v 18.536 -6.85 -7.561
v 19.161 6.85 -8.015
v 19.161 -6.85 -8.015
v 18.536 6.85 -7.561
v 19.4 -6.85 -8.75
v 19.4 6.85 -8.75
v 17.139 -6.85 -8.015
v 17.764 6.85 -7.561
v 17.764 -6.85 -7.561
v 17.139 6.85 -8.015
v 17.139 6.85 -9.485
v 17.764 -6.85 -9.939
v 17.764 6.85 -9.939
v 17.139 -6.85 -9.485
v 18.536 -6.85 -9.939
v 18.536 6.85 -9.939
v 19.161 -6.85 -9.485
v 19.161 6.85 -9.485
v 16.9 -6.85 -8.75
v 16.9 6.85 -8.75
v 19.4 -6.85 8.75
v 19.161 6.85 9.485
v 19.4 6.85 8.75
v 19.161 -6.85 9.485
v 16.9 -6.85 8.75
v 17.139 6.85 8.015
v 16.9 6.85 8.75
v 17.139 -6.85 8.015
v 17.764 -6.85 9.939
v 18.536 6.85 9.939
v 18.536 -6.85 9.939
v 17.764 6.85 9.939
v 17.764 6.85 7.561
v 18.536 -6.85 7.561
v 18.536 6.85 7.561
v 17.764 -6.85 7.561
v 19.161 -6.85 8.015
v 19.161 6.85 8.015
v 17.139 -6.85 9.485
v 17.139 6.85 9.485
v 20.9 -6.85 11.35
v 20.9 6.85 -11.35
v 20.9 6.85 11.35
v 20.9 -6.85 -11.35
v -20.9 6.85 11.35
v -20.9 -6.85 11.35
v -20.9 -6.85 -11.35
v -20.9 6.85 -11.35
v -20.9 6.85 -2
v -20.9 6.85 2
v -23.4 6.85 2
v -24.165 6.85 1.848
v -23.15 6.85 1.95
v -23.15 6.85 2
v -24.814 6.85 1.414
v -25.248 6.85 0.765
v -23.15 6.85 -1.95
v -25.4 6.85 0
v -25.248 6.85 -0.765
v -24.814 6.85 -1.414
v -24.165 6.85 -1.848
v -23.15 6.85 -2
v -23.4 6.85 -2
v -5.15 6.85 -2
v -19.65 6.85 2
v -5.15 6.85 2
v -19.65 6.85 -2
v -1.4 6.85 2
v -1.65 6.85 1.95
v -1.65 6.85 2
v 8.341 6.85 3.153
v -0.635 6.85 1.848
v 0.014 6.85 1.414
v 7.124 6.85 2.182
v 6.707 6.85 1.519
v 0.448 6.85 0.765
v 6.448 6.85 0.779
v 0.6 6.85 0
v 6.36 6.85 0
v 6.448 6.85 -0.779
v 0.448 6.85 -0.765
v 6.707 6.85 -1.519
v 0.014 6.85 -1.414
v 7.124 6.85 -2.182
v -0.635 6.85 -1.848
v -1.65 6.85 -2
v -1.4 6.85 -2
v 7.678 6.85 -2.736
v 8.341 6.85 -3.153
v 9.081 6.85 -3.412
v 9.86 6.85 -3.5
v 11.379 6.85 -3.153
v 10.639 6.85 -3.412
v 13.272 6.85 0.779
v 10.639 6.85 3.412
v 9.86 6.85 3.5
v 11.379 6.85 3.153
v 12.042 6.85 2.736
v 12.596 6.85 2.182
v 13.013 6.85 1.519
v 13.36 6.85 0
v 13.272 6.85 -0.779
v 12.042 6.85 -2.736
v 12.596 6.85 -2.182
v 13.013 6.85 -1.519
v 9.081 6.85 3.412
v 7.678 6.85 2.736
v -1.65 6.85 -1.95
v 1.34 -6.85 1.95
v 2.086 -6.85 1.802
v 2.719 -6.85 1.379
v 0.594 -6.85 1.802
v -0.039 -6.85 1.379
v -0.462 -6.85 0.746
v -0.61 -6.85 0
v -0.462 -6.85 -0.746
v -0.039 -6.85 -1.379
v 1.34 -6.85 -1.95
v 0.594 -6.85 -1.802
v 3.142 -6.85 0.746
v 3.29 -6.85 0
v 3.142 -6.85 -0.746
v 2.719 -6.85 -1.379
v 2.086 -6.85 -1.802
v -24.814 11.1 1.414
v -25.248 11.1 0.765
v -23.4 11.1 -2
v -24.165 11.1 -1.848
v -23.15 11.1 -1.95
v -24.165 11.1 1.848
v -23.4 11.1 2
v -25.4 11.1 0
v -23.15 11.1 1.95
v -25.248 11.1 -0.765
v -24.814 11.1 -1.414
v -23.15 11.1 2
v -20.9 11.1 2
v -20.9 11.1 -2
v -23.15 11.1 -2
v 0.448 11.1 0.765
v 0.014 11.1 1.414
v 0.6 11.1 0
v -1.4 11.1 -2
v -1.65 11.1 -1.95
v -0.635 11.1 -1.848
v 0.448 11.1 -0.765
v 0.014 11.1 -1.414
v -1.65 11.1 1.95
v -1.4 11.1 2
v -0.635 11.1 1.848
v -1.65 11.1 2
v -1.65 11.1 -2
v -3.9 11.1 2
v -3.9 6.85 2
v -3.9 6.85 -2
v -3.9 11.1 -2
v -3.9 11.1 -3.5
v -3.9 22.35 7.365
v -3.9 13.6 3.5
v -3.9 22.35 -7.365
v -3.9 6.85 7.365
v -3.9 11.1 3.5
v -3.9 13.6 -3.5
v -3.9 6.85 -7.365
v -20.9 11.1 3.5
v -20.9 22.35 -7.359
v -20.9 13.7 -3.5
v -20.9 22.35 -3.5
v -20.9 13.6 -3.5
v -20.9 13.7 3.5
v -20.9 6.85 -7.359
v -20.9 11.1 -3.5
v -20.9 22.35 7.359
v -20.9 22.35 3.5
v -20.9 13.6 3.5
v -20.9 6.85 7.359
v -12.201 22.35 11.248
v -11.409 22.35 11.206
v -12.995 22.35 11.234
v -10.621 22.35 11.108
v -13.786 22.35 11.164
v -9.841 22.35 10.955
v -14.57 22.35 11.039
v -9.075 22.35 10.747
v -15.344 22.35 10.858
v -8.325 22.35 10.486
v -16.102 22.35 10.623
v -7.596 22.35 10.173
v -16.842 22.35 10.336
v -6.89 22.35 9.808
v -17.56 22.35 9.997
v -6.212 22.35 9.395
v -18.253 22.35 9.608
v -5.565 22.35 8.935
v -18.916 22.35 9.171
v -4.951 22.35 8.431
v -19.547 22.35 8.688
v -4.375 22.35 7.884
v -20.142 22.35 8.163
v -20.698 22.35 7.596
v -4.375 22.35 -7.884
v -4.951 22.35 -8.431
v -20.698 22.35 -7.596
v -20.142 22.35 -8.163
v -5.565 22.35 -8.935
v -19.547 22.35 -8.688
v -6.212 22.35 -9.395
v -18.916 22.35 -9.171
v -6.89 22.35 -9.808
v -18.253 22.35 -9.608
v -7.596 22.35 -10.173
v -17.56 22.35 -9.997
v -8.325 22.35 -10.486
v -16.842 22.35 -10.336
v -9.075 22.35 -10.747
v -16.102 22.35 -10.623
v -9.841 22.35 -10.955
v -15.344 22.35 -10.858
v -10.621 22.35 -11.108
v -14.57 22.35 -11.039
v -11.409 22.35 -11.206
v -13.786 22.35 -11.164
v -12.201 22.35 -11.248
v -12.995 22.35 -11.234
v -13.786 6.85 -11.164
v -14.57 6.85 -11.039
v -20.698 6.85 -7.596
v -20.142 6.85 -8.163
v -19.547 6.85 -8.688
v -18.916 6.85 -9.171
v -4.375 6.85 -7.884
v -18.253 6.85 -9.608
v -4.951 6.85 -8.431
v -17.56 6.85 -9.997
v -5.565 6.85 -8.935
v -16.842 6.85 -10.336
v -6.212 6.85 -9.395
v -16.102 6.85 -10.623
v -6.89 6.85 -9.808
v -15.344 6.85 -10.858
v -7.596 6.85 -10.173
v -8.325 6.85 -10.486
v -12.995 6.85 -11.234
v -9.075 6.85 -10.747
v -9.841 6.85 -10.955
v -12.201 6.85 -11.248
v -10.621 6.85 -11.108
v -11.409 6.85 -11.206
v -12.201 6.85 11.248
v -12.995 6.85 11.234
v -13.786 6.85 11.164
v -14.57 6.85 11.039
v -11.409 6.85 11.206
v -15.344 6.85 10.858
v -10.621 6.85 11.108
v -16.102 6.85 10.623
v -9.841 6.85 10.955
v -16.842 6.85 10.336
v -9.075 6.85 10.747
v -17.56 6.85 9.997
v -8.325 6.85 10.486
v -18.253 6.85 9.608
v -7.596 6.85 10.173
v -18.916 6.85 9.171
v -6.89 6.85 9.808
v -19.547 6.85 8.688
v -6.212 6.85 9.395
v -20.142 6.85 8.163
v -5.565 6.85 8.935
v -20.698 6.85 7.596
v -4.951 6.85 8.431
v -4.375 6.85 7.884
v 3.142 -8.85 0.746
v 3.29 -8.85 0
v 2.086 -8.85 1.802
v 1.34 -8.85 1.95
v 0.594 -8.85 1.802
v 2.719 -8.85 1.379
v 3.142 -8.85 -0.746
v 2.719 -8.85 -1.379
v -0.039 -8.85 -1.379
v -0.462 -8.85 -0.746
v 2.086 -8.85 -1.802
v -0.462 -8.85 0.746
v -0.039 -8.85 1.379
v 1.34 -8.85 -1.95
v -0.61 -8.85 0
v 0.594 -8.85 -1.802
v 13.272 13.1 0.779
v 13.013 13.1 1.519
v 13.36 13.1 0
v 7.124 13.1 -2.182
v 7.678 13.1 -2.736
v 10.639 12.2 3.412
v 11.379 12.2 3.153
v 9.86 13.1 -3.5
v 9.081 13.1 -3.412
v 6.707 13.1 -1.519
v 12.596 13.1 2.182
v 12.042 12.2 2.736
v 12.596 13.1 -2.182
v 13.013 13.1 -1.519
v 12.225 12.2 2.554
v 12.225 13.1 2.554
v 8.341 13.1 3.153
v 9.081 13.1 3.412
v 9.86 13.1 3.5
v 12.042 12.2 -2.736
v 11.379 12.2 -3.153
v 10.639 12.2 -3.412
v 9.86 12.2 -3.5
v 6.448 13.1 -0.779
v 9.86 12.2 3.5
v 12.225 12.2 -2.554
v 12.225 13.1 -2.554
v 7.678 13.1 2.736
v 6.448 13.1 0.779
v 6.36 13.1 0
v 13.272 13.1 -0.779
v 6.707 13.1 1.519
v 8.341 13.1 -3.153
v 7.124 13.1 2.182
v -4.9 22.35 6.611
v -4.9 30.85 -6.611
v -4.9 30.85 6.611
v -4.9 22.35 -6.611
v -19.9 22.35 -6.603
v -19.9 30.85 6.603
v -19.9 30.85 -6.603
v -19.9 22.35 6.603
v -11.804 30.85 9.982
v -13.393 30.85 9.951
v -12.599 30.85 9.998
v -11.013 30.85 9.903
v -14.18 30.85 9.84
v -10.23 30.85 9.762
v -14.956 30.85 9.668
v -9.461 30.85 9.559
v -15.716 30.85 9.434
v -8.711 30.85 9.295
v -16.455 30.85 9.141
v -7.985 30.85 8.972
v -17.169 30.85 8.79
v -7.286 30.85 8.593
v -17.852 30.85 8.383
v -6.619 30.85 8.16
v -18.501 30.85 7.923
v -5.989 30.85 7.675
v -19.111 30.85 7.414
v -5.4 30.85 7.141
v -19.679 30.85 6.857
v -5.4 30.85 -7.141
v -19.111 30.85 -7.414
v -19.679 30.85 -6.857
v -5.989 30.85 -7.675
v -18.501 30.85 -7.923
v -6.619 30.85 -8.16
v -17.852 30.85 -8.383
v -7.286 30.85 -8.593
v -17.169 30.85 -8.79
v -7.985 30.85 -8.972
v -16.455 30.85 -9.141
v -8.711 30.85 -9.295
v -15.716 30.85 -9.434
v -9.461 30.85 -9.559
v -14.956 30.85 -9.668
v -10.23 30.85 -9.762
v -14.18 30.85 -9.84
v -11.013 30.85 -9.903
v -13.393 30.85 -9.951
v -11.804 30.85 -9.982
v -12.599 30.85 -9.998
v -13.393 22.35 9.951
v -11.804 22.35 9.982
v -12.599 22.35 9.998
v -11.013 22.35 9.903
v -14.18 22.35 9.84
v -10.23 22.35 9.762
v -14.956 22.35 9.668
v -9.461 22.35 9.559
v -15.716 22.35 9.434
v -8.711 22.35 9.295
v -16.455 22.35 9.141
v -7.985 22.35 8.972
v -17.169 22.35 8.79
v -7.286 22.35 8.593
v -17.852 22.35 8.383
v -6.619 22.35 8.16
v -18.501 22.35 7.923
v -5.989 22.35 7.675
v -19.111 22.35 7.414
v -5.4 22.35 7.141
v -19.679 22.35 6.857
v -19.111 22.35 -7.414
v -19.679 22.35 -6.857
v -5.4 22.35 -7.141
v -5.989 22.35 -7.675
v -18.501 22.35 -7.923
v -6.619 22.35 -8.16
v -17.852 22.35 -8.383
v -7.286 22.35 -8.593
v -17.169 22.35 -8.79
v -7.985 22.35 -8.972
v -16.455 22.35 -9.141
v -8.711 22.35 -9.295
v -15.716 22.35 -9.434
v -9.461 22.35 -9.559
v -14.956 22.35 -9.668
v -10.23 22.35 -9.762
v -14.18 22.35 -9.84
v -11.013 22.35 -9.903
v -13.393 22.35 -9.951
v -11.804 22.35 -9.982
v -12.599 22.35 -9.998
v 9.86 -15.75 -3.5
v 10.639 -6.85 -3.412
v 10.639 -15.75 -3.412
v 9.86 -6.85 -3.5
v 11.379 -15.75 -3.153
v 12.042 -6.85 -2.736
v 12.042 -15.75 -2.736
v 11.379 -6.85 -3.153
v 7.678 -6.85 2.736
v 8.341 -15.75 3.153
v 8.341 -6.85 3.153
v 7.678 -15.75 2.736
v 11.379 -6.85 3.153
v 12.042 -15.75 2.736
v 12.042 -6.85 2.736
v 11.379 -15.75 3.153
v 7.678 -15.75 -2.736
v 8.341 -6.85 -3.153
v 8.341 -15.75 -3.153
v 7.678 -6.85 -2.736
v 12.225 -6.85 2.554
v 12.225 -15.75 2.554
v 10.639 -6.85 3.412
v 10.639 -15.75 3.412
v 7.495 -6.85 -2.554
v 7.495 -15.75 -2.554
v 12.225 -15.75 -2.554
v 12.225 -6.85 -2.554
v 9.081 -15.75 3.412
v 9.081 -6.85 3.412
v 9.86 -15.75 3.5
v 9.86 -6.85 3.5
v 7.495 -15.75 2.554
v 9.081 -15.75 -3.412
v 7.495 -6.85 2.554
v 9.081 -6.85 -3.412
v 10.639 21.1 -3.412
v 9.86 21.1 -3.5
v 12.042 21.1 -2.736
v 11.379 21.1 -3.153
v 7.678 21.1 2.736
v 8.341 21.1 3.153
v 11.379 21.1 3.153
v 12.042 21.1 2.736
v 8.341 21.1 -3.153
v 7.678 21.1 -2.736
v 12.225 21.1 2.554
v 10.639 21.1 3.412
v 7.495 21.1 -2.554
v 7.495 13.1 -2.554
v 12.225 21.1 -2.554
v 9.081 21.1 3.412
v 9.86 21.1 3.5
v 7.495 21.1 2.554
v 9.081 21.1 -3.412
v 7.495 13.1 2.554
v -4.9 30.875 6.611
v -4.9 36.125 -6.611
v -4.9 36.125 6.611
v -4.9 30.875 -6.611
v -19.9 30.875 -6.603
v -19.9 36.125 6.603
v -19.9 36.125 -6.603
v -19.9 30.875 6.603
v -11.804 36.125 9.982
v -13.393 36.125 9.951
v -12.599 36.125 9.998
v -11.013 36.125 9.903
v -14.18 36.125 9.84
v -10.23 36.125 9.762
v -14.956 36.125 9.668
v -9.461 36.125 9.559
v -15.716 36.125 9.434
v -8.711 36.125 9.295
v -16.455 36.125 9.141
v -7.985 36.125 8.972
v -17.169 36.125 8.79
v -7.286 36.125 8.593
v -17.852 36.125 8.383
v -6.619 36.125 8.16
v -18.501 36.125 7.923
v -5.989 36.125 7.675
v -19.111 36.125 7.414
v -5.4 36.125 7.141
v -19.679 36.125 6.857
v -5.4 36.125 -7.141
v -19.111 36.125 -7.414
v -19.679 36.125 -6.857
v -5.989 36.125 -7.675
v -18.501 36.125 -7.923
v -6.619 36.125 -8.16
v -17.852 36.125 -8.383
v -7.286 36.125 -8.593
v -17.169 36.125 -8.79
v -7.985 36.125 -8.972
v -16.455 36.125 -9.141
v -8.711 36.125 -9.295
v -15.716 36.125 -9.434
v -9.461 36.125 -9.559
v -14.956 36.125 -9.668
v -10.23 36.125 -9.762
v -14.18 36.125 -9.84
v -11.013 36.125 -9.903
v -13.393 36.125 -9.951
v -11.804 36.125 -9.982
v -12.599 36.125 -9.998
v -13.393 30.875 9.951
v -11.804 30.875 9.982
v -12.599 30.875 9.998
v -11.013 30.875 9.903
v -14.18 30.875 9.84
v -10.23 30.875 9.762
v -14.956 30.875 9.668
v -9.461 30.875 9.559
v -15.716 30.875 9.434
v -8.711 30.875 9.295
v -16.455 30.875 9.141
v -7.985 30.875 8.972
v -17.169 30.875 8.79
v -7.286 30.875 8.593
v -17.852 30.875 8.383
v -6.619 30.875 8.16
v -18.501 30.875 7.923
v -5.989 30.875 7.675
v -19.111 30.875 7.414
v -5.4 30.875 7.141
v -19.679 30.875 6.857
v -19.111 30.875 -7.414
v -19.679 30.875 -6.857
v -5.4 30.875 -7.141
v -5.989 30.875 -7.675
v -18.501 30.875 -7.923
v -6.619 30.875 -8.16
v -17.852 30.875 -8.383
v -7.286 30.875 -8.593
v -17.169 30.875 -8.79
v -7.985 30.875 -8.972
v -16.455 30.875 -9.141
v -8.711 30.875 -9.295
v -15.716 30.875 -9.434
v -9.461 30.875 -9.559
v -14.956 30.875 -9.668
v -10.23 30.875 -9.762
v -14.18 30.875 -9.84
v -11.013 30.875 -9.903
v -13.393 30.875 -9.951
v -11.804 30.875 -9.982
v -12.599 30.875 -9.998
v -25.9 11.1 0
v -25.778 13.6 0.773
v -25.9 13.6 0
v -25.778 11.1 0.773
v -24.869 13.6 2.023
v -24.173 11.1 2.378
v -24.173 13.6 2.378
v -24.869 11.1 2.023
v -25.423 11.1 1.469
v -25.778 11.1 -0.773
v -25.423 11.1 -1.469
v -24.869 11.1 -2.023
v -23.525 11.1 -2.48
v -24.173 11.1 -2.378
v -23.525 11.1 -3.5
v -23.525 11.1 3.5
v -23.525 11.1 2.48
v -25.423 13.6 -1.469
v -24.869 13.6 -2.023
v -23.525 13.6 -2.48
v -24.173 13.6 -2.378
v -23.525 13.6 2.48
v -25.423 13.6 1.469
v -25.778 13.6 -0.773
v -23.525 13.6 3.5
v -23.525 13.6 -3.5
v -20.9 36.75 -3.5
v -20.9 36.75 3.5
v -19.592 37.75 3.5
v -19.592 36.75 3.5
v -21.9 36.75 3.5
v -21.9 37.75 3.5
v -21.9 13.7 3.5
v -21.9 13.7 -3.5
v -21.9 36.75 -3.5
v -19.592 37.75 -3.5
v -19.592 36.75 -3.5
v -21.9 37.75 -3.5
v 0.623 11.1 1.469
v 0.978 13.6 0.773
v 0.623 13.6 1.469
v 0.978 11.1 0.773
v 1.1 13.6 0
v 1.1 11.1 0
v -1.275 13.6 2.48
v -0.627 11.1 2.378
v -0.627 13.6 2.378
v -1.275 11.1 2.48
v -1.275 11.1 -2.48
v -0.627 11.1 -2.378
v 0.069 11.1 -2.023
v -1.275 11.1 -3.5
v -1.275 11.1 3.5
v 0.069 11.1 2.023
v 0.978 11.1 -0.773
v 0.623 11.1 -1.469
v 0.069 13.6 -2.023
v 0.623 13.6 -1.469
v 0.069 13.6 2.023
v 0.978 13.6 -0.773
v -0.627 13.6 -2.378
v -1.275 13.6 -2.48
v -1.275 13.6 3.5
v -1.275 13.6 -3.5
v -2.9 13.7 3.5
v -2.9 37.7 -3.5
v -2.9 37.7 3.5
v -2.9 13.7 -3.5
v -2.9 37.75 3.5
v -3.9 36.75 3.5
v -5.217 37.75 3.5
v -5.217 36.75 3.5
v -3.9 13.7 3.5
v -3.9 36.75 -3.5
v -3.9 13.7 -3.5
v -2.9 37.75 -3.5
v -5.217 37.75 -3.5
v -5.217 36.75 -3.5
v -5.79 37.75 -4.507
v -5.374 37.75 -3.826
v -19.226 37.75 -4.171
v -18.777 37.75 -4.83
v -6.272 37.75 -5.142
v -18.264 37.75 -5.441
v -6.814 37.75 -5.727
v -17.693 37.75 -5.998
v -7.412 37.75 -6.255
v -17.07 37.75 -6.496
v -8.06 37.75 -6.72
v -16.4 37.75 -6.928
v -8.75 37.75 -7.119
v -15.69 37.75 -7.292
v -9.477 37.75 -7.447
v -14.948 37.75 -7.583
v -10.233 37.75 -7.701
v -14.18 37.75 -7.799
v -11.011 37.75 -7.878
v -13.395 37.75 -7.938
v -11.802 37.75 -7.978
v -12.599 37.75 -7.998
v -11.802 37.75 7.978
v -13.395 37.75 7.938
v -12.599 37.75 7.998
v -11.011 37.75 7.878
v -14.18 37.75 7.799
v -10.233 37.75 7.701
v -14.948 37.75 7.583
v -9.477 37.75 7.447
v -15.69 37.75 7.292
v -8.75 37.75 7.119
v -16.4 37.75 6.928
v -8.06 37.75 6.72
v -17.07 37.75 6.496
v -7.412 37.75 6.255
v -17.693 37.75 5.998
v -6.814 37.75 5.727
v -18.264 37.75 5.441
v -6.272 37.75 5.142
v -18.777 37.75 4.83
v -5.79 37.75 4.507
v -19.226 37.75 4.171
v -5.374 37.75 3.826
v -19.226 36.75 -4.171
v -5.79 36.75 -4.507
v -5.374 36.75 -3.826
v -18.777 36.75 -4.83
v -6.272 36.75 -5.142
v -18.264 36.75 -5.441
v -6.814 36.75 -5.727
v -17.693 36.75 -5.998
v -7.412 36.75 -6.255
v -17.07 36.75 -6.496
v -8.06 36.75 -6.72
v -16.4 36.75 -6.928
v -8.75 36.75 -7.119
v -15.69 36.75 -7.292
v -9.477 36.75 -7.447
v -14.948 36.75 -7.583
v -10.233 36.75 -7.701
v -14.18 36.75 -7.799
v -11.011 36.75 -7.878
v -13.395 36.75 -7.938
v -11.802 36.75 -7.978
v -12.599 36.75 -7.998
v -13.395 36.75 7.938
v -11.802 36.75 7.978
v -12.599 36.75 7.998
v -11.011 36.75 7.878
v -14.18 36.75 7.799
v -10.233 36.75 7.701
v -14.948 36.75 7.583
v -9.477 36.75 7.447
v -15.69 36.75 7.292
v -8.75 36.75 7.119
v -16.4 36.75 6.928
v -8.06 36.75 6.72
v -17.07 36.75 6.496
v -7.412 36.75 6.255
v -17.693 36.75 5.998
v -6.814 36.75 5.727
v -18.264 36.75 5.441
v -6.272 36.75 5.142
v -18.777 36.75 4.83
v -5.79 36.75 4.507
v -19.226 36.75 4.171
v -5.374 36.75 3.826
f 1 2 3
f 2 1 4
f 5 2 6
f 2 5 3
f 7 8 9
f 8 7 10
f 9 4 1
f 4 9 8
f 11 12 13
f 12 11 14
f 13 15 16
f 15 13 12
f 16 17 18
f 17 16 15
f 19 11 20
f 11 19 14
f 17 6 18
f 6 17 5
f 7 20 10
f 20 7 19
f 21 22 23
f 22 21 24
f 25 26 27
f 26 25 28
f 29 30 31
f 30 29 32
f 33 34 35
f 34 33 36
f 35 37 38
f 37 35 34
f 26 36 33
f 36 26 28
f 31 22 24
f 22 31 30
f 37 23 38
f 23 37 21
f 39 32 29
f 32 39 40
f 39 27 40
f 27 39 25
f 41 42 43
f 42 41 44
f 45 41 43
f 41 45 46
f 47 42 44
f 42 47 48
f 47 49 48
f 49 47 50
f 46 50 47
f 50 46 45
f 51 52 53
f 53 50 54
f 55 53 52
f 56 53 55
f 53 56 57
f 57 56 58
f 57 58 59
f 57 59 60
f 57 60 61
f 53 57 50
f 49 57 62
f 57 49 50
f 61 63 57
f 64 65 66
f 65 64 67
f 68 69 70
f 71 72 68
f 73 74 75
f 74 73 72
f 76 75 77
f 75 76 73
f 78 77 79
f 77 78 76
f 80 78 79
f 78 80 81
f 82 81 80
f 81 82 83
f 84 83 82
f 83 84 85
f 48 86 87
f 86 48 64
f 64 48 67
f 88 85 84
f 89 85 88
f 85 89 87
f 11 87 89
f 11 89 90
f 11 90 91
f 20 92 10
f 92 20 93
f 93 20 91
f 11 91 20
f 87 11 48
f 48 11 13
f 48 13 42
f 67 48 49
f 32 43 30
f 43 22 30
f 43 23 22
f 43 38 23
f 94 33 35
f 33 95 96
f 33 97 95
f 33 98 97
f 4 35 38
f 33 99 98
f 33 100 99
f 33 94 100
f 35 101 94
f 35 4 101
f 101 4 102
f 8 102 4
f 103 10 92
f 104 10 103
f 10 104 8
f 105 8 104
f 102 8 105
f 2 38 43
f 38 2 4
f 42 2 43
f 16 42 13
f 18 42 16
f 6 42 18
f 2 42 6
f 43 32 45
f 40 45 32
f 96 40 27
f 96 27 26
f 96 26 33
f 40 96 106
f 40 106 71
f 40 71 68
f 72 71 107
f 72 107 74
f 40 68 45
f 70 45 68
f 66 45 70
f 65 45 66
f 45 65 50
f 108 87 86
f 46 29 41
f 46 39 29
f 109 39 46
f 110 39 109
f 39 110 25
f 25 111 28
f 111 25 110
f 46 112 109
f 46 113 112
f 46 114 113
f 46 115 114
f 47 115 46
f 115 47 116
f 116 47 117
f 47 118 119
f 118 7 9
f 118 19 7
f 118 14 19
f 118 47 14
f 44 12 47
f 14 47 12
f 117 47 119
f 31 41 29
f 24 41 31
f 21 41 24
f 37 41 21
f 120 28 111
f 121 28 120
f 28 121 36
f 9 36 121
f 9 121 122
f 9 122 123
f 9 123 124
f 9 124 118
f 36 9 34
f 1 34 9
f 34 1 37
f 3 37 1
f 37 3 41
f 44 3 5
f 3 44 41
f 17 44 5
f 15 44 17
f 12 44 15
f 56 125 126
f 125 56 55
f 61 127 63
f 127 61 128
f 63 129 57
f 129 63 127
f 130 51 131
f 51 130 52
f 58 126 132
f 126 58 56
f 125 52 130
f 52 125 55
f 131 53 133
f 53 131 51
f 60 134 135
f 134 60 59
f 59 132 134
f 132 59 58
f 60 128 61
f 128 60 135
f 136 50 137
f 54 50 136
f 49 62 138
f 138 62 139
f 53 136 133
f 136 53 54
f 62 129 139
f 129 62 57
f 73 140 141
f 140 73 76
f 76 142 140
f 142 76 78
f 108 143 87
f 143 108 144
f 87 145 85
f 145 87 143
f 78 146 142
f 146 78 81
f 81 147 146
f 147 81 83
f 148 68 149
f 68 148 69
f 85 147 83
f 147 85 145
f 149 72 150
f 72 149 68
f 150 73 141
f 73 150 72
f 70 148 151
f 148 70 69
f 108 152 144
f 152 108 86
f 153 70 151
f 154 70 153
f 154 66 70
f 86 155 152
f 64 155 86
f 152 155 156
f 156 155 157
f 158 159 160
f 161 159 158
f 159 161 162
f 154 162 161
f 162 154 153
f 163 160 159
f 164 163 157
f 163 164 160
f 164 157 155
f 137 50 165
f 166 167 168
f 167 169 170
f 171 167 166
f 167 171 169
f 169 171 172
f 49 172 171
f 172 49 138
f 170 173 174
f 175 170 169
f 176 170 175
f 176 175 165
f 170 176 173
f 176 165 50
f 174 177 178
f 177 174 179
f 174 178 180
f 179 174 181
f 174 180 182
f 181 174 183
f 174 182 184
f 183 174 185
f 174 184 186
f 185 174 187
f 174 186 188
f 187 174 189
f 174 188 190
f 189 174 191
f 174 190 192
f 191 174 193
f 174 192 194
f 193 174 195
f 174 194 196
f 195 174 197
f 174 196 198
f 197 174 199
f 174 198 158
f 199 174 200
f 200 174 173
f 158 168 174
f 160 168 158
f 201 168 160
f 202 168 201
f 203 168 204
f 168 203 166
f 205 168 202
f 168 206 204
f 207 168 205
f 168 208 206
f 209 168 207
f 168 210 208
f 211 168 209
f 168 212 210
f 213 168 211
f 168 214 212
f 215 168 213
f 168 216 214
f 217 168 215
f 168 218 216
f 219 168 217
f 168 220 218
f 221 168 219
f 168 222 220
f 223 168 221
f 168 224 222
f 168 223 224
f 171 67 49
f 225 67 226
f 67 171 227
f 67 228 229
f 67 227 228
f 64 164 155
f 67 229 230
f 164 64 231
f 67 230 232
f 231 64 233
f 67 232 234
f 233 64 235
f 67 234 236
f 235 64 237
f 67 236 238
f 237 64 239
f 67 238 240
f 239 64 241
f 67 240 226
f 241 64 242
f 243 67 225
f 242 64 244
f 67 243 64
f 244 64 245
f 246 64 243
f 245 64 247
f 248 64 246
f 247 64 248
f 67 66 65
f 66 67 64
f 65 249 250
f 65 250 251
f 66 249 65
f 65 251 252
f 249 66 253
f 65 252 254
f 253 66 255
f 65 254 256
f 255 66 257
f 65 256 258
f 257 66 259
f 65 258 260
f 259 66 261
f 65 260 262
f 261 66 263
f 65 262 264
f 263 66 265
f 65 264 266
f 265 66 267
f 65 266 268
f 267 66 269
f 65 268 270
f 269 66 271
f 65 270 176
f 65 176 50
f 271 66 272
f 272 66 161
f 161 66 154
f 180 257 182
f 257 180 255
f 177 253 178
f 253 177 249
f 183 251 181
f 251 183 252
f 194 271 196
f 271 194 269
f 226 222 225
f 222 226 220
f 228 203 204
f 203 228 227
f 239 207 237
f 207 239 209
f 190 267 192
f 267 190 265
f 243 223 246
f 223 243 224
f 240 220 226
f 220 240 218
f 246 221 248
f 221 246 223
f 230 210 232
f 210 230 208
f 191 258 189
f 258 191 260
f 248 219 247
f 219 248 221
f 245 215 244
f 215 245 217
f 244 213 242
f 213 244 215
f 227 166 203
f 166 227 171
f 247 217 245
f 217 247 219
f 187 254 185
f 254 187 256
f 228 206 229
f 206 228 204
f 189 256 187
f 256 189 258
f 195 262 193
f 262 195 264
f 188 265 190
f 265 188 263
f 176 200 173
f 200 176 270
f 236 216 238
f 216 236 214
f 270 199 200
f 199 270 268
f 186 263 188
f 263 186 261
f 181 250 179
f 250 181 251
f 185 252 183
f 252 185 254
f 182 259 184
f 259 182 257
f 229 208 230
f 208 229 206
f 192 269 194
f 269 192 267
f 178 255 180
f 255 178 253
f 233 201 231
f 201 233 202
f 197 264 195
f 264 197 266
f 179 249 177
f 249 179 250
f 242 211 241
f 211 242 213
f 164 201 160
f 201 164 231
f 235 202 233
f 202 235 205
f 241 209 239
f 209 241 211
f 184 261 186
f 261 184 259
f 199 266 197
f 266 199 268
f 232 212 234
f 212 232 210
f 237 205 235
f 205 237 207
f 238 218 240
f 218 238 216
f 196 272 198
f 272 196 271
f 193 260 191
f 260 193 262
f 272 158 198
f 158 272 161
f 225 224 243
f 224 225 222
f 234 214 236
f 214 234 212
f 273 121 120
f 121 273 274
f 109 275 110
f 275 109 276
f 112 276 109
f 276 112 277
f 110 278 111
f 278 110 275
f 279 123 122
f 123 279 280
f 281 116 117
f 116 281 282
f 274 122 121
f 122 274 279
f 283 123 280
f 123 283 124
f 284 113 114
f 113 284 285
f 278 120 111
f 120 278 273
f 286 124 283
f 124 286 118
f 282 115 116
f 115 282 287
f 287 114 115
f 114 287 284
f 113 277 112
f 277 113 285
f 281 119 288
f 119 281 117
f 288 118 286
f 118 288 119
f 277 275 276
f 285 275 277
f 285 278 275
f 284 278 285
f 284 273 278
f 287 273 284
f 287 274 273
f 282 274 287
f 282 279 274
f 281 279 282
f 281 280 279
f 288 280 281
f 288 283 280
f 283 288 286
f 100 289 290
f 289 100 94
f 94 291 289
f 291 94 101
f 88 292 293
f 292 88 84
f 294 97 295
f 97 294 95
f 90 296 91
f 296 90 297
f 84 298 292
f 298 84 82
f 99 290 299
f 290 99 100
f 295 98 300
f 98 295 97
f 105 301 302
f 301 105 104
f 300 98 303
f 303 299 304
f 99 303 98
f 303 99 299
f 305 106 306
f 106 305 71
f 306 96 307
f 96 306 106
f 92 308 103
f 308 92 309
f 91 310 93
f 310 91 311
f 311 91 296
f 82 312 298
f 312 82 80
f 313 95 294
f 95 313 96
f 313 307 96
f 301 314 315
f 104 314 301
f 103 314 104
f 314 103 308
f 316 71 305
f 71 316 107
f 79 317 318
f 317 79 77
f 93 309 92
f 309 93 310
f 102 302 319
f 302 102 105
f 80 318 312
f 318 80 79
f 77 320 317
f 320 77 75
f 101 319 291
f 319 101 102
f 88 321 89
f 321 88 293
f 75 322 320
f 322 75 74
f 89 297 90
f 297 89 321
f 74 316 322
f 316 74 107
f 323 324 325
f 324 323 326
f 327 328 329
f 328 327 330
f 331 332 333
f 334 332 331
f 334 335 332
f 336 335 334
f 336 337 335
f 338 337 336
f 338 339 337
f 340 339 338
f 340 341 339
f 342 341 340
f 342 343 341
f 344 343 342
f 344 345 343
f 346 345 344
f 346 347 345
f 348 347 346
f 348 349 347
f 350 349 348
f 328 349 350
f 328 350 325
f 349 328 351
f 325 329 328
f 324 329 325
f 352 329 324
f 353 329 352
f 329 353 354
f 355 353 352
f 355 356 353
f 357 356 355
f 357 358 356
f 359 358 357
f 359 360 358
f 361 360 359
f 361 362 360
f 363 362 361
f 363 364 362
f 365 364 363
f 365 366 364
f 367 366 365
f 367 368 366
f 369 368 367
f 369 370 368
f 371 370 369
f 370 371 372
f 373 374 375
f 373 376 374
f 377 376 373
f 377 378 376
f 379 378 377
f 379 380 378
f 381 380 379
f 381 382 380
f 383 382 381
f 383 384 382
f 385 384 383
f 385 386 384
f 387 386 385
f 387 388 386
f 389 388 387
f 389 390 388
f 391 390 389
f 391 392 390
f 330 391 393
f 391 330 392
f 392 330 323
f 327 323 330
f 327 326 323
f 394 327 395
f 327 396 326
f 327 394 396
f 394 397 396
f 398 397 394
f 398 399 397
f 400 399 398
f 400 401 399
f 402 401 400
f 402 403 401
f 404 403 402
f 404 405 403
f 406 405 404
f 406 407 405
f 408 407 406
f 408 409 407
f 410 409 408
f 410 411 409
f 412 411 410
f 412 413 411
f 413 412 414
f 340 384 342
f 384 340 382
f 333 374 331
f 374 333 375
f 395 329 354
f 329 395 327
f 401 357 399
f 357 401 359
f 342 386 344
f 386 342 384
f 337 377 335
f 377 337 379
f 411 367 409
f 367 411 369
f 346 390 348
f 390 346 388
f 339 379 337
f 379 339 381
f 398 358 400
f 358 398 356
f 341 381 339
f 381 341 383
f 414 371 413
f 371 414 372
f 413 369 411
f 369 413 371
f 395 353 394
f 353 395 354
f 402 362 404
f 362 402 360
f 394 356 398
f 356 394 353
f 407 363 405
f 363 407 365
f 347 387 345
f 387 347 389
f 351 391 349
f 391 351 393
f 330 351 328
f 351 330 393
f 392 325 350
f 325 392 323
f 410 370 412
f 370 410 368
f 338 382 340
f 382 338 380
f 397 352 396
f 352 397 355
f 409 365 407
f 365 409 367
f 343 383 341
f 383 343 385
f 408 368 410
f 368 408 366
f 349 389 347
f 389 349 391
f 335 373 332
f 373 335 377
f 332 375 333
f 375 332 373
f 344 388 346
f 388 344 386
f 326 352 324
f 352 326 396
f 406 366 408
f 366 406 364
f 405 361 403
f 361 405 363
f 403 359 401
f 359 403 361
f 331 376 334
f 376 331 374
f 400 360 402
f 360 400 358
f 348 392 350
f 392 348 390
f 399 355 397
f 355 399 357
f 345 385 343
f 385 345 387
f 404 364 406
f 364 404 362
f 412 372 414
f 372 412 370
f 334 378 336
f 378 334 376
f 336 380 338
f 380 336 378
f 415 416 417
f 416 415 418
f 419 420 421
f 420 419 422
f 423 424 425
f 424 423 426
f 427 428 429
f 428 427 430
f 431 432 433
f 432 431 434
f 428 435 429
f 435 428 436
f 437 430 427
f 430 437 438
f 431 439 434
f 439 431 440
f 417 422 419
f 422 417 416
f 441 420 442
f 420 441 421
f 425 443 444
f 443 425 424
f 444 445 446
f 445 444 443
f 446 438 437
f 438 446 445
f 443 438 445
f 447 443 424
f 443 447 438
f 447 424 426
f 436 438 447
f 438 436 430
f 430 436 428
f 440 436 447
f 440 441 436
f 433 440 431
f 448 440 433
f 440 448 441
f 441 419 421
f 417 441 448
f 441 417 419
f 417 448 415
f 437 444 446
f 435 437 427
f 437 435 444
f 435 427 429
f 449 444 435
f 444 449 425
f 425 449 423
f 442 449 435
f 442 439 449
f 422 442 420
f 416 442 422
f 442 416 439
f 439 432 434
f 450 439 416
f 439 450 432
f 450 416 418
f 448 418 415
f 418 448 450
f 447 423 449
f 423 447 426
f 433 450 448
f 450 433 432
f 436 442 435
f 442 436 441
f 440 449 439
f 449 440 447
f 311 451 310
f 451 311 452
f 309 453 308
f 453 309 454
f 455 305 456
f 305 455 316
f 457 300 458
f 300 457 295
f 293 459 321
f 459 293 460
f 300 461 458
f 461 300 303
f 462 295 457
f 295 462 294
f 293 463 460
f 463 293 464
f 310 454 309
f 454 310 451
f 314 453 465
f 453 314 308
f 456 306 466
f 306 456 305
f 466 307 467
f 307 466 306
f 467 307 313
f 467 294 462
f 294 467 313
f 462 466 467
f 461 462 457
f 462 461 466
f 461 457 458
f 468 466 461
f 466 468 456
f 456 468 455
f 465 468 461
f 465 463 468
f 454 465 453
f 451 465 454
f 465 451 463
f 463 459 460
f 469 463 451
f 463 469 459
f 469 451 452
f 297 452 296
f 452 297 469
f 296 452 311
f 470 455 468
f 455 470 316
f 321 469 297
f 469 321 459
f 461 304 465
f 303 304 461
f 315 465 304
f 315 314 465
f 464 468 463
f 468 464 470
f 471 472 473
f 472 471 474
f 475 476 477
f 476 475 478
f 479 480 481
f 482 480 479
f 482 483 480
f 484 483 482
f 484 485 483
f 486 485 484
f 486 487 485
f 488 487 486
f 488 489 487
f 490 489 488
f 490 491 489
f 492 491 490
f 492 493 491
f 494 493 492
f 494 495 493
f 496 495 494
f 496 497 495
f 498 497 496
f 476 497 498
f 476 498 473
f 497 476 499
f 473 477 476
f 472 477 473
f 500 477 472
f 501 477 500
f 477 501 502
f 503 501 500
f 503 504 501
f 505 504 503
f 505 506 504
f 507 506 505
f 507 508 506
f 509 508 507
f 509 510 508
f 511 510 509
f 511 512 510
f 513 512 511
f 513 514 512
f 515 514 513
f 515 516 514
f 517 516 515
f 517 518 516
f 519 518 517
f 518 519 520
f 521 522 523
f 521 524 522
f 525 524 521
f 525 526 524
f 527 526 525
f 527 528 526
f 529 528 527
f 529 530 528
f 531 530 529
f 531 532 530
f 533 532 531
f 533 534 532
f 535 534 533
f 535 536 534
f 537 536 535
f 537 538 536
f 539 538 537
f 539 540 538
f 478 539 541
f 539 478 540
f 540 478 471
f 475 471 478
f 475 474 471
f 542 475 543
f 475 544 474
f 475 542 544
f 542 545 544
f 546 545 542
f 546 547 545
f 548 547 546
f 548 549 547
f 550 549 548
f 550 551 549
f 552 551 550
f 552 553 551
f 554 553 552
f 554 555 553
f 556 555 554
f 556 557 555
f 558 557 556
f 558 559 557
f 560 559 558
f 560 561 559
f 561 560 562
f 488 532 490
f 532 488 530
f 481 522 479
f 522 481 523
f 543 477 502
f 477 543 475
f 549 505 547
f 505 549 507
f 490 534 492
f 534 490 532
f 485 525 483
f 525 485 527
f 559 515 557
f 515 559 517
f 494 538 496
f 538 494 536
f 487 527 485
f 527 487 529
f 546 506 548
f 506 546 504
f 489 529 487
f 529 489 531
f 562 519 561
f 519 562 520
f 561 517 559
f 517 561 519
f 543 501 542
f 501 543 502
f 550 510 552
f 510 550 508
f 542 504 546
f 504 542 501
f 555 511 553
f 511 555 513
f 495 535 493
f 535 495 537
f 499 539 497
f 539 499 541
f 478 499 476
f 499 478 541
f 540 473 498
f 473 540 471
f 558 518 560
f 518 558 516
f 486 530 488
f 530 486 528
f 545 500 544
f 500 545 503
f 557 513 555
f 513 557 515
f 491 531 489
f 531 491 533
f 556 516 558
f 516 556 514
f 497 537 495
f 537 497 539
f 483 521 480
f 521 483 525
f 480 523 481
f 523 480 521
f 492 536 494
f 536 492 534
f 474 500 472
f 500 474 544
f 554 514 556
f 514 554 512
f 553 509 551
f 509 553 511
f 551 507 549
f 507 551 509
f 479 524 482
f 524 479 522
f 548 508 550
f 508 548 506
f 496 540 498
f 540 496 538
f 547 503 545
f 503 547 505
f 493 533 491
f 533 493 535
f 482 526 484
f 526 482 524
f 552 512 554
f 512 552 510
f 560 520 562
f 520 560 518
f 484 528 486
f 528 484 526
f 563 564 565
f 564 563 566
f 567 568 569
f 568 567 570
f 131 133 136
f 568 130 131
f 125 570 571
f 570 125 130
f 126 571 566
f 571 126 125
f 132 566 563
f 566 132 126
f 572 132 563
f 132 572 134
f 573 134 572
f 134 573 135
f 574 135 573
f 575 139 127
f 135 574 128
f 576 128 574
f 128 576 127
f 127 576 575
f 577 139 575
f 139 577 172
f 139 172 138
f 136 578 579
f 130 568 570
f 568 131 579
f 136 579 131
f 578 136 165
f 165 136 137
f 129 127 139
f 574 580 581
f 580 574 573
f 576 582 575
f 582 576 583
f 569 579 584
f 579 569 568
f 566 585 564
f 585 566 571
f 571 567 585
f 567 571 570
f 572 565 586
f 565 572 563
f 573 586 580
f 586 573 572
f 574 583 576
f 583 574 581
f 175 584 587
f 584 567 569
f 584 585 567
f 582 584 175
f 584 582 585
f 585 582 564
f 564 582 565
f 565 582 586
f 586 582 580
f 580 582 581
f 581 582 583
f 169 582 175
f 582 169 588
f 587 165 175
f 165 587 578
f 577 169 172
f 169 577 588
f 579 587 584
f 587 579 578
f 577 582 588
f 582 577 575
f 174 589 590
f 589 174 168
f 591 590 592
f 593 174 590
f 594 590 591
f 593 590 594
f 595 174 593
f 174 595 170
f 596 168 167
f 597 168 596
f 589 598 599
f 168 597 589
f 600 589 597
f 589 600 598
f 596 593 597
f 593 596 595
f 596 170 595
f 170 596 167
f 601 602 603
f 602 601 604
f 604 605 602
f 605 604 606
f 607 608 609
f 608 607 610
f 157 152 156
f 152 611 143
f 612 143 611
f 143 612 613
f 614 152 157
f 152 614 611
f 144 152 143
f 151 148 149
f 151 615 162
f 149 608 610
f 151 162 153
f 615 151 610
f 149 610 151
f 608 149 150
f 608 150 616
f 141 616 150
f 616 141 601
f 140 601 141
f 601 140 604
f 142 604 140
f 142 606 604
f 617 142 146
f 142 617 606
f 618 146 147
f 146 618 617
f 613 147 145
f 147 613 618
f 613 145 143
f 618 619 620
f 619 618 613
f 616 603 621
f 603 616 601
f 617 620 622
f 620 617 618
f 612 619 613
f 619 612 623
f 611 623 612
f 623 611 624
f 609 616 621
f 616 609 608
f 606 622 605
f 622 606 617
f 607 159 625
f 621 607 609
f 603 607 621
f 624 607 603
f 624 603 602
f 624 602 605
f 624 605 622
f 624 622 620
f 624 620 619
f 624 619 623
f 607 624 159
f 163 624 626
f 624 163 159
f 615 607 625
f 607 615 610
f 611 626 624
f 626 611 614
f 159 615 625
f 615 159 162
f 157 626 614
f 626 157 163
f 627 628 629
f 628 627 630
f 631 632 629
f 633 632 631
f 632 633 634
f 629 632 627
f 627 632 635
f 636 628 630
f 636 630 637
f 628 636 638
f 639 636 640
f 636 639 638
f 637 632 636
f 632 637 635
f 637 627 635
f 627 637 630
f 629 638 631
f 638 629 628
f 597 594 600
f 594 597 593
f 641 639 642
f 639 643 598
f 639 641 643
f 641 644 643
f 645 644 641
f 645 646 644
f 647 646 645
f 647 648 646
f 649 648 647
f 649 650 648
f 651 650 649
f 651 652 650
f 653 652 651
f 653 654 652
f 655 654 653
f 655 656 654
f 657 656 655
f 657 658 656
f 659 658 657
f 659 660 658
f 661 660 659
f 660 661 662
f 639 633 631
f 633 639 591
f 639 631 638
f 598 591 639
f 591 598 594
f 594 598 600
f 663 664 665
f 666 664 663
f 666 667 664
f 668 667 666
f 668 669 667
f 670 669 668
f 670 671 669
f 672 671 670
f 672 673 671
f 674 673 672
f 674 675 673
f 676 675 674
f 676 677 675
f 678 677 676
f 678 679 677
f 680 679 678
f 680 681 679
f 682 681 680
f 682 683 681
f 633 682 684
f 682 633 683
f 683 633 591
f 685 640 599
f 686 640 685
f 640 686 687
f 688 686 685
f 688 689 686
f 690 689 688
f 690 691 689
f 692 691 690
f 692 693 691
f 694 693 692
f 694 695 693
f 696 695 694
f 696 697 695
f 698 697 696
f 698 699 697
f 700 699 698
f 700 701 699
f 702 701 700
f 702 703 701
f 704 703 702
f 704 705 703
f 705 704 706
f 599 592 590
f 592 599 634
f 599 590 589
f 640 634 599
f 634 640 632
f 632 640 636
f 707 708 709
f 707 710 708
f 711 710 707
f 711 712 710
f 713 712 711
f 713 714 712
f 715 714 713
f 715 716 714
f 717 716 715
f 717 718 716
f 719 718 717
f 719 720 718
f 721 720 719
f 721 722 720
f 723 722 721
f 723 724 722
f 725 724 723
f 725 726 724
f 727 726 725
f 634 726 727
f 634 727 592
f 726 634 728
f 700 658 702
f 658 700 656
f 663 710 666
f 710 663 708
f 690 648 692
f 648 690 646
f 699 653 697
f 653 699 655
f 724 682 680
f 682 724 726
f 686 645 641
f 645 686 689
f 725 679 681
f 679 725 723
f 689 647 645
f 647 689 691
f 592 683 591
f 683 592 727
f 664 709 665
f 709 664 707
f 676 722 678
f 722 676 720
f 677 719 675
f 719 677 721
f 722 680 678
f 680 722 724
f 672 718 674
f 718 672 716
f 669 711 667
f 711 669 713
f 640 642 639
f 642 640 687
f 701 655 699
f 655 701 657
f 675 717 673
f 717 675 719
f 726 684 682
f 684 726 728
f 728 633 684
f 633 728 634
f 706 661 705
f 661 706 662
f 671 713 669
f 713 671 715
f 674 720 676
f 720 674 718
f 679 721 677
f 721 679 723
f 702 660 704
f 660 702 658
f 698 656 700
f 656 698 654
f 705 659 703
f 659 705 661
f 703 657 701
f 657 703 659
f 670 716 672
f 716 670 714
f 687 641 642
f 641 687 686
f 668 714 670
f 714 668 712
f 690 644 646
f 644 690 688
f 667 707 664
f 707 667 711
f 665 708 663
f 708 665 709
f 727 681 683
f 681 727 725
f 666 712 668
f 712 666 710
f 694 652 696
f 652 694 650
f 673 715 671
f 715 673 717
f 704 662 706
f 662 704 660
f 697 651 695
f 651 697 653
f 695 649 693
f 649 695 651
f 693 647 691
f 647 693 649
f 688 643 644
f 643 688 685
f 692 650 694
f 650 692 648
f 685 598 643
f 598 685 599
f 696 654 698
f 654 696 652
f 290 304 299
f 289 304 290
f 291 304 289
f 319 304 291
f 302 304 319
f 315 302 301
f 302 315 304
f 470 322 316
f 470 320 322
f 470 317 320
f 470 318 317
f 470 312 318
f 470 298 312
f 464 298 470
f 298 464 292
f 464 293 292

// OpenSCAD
// -*-C-*-
// Modules for various motors.
//
// Copyright 2013, Brian Davis
//
// License: LGPL 2.1 or later

$fn=0;
$fa=0.01;
$fs=0.8;

/*
 * This is a generic motor unit made from yellow injection molded
 * plastic containing a gearbox and two axle attachment points.  A small
 * DC motor is attached to the body and held in place via a strap.
 *
 * The gearbox on this motor projects directly back from the motor,
 * unlike some similar models in which the gearbox is partially
 * perpindicular.
 *
 * Note: details of the motor attachment mechanism are not modeled
 * precisely, and two cylindrical slots for connections are also not
 * present.
 *
 * Totals:
 * width (x-axis) = 37mm
 * length (y-axis) = 71mm 
 * height (z-axis) = 22.5mm
 */
module yellow_dc_gearmotor_straight() {
  // Center the model.
  translate([-9.5, -33.5, -11.25])
  union() {
    difference() {
      // Square portion of motor body.
      cube([19, 37.75, 22.5]);
      union() {
        // Top mounting through-hole.
        translate([-0.5, 32.25, 20])
          rotate([0, 90, 0])
            cylinder(h=20, r=1.5);
        // Bottom mounting through-hole.
        translate([-0.5, 32.25, 2.5])
          rotate([0, 90, 0])
            cylinder(h=20, r=1.5);
      }
    }
    // Cylindrical portion of motor body.
    difference() {
      difference() {
        translate([9.5, 49.5, 11.25])
          rotate([90, 0, 0])
            cylinder(h=11.75, r=11.25);
        translate([-5, 37.5, 0])
          cube([5, 12.5, 23]);
      }
      translate([19, 37.5, 0])
        cube([5, 12.5, 23]);
    }
    difference() {
      difference() {
        // Motor (note that the top part is actually white).
        color("grey")
        translate([9.5, 63.5, 11.25])
          rotate([90, 0, 0])
            cylinder(h=14, r=10);
        translate([-5, 49, 0])
          cube([5, 15, 23]);
      }
      translate([19, 49, 0])
        cube([5, 15, 23]);
    }
    // Rubber strap holding the motor in place.
    color("grey")
    translate([-0.5, 39.75, 7])
      cube([20, 24, 8.25]);
    // Tabs holding the rubber strap in place.
    translate([-1.75, 44, 8.45])
      cube([22.4, 2.5, 5]);
    // Small portion of the motor sticking out past the strap.
    color("white")
    translate([9.5, 65, 11.25])
      rotate([90, 0, 0])
      cylinder(h=1, r=5);
    // Tip of the motor shaft.
    color("grey")
    translate([9.5, 66, 11.25])
      rotate([90, 0, 0])
      cylinder(h=1, r=0.5);
    // Motor electrical connection points (poorly modeled, actually
    // small copper tabs).
    color("gold")
    translate([17.5, 60, 3.75])
      cube([2, 3, 15]);
    // Rear connection point tab with round hole.
    difference() {
      translate([8, -5, 9])
        cube([3, 5, 5]);
      translate([7.75, -2.5, 11.5])
        rotate([0, 90, 0])
          cylinder(h=3.5, r=1.5);
    }
    // Random round protrusion on side opposite to motor electrical
    // connection point.
    translate([-2, 23.25, 11.5])
      rotate([0, 90, 0])
        cylinder(h=2, r=2);
    // Axles (actually not fully round, but close enough).
    color("white")
    translate([-9, 12.6, 11.5])
      rotate([0, 90, 0])
        cylinder(h=37, r=2.75);
  }
}

module solarbotics_gearmotor_straight() {
  yellow_dc_gearmotor_straight();
}

module solarbotics_gearmotor_angled() {
  color("yellow")
  union() {
    // Main body, set at an angle to the motor mount; contains the
    // gearbox and mounts the axles.
    difference() {
      cube([41.8, 13.7, 22.7], center=true);
      // Mounting holes.
      union() {
        for (z_mult = [-1 : 2 : 1]) {
          translate([18.15, 0, z_mult * 8.75])
            rotate([90, 0, 0])
            cylinder(r=1.25, h=13.8, center=true);
        }
      }
    }
    // Anchors for motor straps.
    for (x_mult = [-1 : 2 : 1]) {
      translate([-12.4 + (x_mult * 11), 9.6, 0])
        rotate([90, 0, 0])
          cylinder(r=2, h=5.5, center=true);
      translate([-12.4 + (x_mult * 9), 9.6, 0])
        cube([3.5, 5.5, 4], center=true);
    }
    // Base of motor holder.
    translate([-12.4, 14.6, 0])
      intersection() {
        cube([17, 15.5, 22.7], center=true);
        rotate([90, 0, 0])
          cylinder(r=11.25, h=15.5, center=true);
      }
    // Small round protrusion on the rear of the main body.
    translate([1.34, -7.85, 0])
      rotate([90, 0, 0])
        cylinder(r=1.95, h=2, center=true);
    // Base of encoder mount.
    translate([9.86, 8.35, 0])
      rotate([90, 0, 0])
        cylinder(r=3.5, h=3, center=true);
  }
  // Portion of the motor body between the motor mount and the motor
  // strap.
  color("silver")
    translate([-12.4, 26.6, 0])
      intersection() {
        cube([15, 8.5, 20], center=true);
        rotate([90, 0, 0])
          cylinder(r=10, h=8.5, center=true);
      }

  color("white")
  union() {
    // Axle.
    translate([9.86, -11.3, 0])
      intersection() {
        rotate([90, 0, 0])
          cylinder(r=3.5, h=8.9, center=true);
      cube([4.73, 9, 7.1], center=true);
    }
    // Encoder mount (NOTE: should not be loaded heavily).
    translate([9.86, 16.65, 0])
      intersection() {
        rotate([90, 0, 0])
          cylinder(r=3.5, h=8.9, center=true);
      cube([4.73, 9, 7.1], center=true);
    }
    translate([9.86, 11.475, 0])
      rotate([90, 0, 0])
        cylinder(r=3.5, h=3.25, center=true);
    translate([-12.4, 33.5, 0])
      intersection() {
        cube([15, 5.25, 20], center=true);
        rotate([90, 0, 0])
          cylinder(r=10, h=5.25, center=true);
      }
    for (x_mult = [-1 : 2 : 1]) {
      translate([-12.4 + (x_mult * 11), 12.35, 0])
        rotate([90, 0, 0])
          cylinder(r=2.5, h=2.5, center=true);
      translate([-12.4 + (x_mult * 9), 12.35, 0])
        cube([4.25, 2.5, 7], center=true);
      translate([-12.4 + (x_mult * 9), 25.7, 0])
        cube([1, 24, 7], center=true);
    }
    translate([-12.4, 37.25, 0])
      union() {
        cube([19, 1, 7], center=true);
        rotate([90, 0, 0])
          cylinder(r=8, h=1, center=true);
      }
  }
}

/*
 * This is a Denso left side power window motor.  Some details are not
 * modeled precisely.
 */
module denso_power_window_motor_L() {
  translate([0, 0, 117.5])
    cylinder(r=2, h=10, center=true);
  color("brown")
  translate([-30, 30, 85])
    rotate([0, 90, 0])
    cylinder(r=4.5, h=35, center=true);
  color("gray")
  union() {
    hull() {
      translate([0, 20, 122.5])
        rotate([0, 90, 0])
          cylinder(r=4.5, h=10, center=true);
      translate([0, 30, 85])
        rotate([0, 90, 0])
          cylinder(r=25 / 2, h=10, center=true);
    }
    hull() {
      translate([0, 65, 102.5])
        rotate([0, 90, 0])
	cylinder(r=4.5, h=10, center=true);
      translate([0, 30, 85])
        rotate([0, 90, 0])
	cylinder(r=25 / 2, h=10, center=true);
    }
    hull() {
      translate([6, 10, 115])
        rotate([0, 90, 0])
          cylinder(r=4.5, h=14, center=true);
      translate([6, 30, 85])
        rotate([0, 90, 0])
          cylinder(r=25 / 2, h=14, center=true);
    }
    hull() {
      translate([6, 47.5, 52.5])
        rotate([0, 90, 0])
          cylinder(r=4.5, h=14, center=true);
      translate([6, 30, 85])
        rotate([0, 90, 0])
          cylinder(r=25 / 2, h=14, center=true);
    }
    translate([0, 30, 85])
      rotate([0, 90, 0])
        cylinder(r=30, h=27.5, center=true);
    translate([0, 0, 76.5])
      cylinder(r=13.8 / 2, h=72, center=true);
    translate([0, 0, 55.5])
      cylinder(r=14.8 / 2, h=30, center=true);
    translate([0, 0, 46.5])
      cylinder(r=15.8 / 2, h=12, center=true);
    translate([0, 0, 55])
      difference() {
        cylinder(r=20, h=29, center=true);
        union() {
          translate([-(32 / 2) - 20, 0, 0])
            cube([40, 40, 30], center=true);
          translate([(32 / 2) + 20, 0, 0])
            cube([40, 40, 30], center=true);
          translate([-(23.8 / 2) - 15, 10, 0])
            cube([40, 40, 30], center=true);
          translate([-(23.8 / 2) - 15, -14.9, 12])
            cube([40, 10, 30], center=true);
        }
      }
    hull() {
      translate([18, 16, 40])
        cylinder(r=4.5, h=5, center=true);
      translate([15, 13, 40])
        cube([5, 10, 5], center=true);
    }
    hull() {
      translate([-18, -16, 40])
        cylinder(r=4.5, h=5, center=true);
      translate([-15, -13, 40])
        cube([5, 10, 5], center=true);
    }
    translate([0, 0, 39.5])
      difference() {
        cylinder(r=45.8 / 2, h=2, center=true);
        union() {
          translate([-(37 / 2) - 20, 0, 0])
            cube([40, 40, 3], center=true);
          translate([(37 / 2) + 20, 0, 0])
            cube([40, 40, 3], center=true);
        }
      }
  }
  color("black")
  union() {
    translate([0, 0, 37.5])
      difference() {
        cylinder(r=45.8 / 2, h=2, center=true);
        union() {
          translate([-(37 / 2) - 20, 0, 0])
            cube([40, 40, 74], center=true);
          translate([(37 / 2) + 20, 0, 0])
            cube([40, 40, 3], center=true);
        }
      }
    difference() {
      cylinder(r=43.8 / 2, h=73, center=true);
      union() {
        translate([-(35 / 2) - 20, 0, 0])
          cube([40, 40, 74], center=true);
        translate([(35 / 2) + 20, 0, 0])
          cube([40, 40, 74], center=true);
      }
    }
    translate([0, 0, -54.5])
      cylinder(r2=30 / 2, r1=27.5 / 2, h=18);
    translate([0, 0, -60.5])
      cylinder(r2=16.5 / 2, r1=10 / 2, h=6);
  }
}

/*
 * This is an IG32 gear motor from superdroidrobots.com which has been
 * attached to a square aluminum plate.
 */
module ig32_gear_motor_with_sprocket_and_plate() {
  // Shaft + sprocket
  // FIXME extremely simplified
  color("gray")
  union() {
    translate([0, 0, 57])
      cylinder(r=(11.2 / 2.0), h=8.5, center=true);
    translate([0, 0, 62.75])
      cylinder(r=10.4, h=3, center=true);
  }
  // Mounting plate.
  color("silver")
  translate([0, 0, 51])
  difference() {
    cube([44.4, 44.4, 3.75], center=true);
    union() {
      for (x_mult = [-1 : 2 : 1]) {
        for (y_mult = [-1 : 2 : 1]) {
          translate([x_mult * ((44.4 / 2.0) - 4),
                     y_mult * ((44.4 / 2.0) - 4), 0])
            cylinder(r=2, h=5, center=true);
        }
      }
    }
  }
  // Main motor body
  color("silver")
  translate([0, 0, 46.25])
    cylinder(r=16, h=6, center=true);
  color("black")
  union() {
    translate([0, 0, 42.25])
      cylinder(r1=(35 / 2), r2=16, h=1);
    translate([0, 0, 33.75])
      cylinder(r=(35 / 2), h=17, center=true);
    translate([0, 0, 24.25])
      cylinder(r1=16, r2=(35 / 2), h=1);
  }
  color("silver")
  translate([0, 0, 22])
    cylinder(r=16, h=4.5, center=true);
  color("gray")
  translate([0, 0, 17.5])
    cylinder(r=(35.7 / 2.0), h=4.5, center=true);
  color("gray")
  translate([0, 0, -1.725])
    cylinder(r=(37 / 2.0), h=34, center=true);
  color("gray")
  translate([0, 0, -26.75])
    cylinder(r=(35.7 / 2.0), h=16, center=true);
  color("white")
  translate([0, 0, -36])
    cylinder(r=(35.7 / 2.0), h=2.5, center=true);
  color("black")
  translate([0, 0, -51.25])
    cylinder(r1=(34.5 / 2.0), r2=(35 / 2), h=14);
}

/*
 * This is a Unite model MY1016 250 Watt motor for
 * electric scooter or go-kart.
 */
module unite_my1016() {
  color("gray")
  union() {
    translate([-44, 0, 55])
      rotate([0, 90, 0])
        cylinder(r=14.5, h=5, center=true);
    translate([-36, 0, 55])
      rotate([0, 90, 0])
        cylinder(r=47.5, h=11, center=true);
    for (x_mult = [-1 : 2 : 1]) {
      translate([x_mult * 29, 0, 55])
        rotate([0, 90, 0])
          cylinder(r=50.5, h=3, center=true);
    }
    translate([32.5, 0, 55])
      rotate([0, 90, 0])
        cylinder(r=47.5, h=4, center=true);
  }
  color("black")
  union() {
    // Central main body.
    translate([0, 0, 55])
      rotate([0, 90, 0])
        cylinder(r=51, h=55, center=true);
    // Shaft
    translate([43.5, 0, 55])
      rotate([0, 90, 0])
        cylinder(r=5, h=26, center=true);
    // Sprocket
    // NOTE: diameter is correct but teeth are not shown.
    translate([47, 0, 55])
      rotate([0, 90, 0])
        cylinder(r=12, h=3, center=true);
    // Mounts.
    for (y_mult = [-1 : 2 : 1]) {
      difference() {
        translate([7, y_mult * 47.5, 2])
          cube([55, 13, 4], center=true);
        union() {
          for (x_mult = [-1 : 2 : 1]) {
            translate([7 + (x_mult * 20.5), y_mult * 47.25, 2])
              cylinder(r=3.25, h=5.5, center=true);
          }
        }
      }
      hull() {
        translate([7, y_mult * 40.5, 2])
          cube([55, 1, 4], center=true);
        translate([7, y_mult * 32.5, 2])
          cube([32, 9, 4], center=true);
      }
      translate([7, y_mult * 25.5, 5.5])
        rotate([y_mult * -45, 0, 0])
          cube([32, 12, 4], center=true);
    }
  }
}


/*
 * This is a Unite model MY6812 100 Watt motor for
 * electric scooter or go-kart.
 */
module unite_my6812() {
  color("gray")
  union() {
    // Shaft + sprocket end
    translate([40.25, 0, 0])
      difference() {
        rotate([0, 90, 0])
          cylinder(r=34, h=9.5, center=true);
        for (x_angle = [0 : 120 : 240]) {
          rotate([x_angle, 0, 0])
            translate([0, 0, 21.5])
              rotate([0, 90, 0])
                cylinder(r=2.5, h=10, center=true);
        }
      }
    // Rear end.
    translate([-40, 0, 0])
      union() {
        rotate([0, 90, 0])
          cylinder(r=34, h=9, center=true);
        translate([-9.75, 0, 0])
          rotate([0, 90, 0])
            cylinder(r=15, h=10.5, center=true);
    }
  }
  color("black")
  union() {
    // Central main body
    translate([0, 0, 0])
      rotate([0, 90, 0])
        cylinder(r=34, h=71, center=true);
    // Shaft + Sprocket
    translate([57.5, 0, 0])
      union() {
        // Shaft
        rotate([0, 90, 0])
          cylinder(r=6, h=25, center=true);
        // Sprocket
        // NOTE: diameter is correct but teeth are not shown.
        translate([1, 0, 0])
          rotate([0, 90, 0])
            cylinder(r=12, h=2.75, center=true);
      }
    // Power cord
    translate([35.5, 5, -34])
      rotate([5, 0, 0])
        cube([13, 13, 4], center=true);
    translate([35.5, 5, -38])
      rotate([5, 0, 0])
        cylinder(r=3.5, h=8, center=true);
    translate([0, 5.25, -41])
      rotate([0, 90, 0])
        cylinder(r=3.5, h=77.5, center=true);
  }
}

NEMA_23_WIDTH = 49.25;

module nema_23_stepper_motor(l=100) {
  //  color("black")
  difference() {
    cube([NEMA_23_WIDTH, NEMA_23_WIDTH, l], center=true);
    for (x_mult = [-1 : 2 : 1]) {
      for (y_mult = [-1 : 2 : 1]) {
        translate([x_mult * ((NEMA_23_WIDTH / 2) - 4.9),
                   y_mult * ((NEMA_23_WIDTH / 2) - 4.9),
                   -3.6])
          cube([10.1, 10.1, 93], center=true);
        translate([x_mult * ((NEMA_23_WIDTH / 2) - 4.9),
                   y_mult * ((NEMA_23_WIDTH / 2) - 4.9),
                   46.5])
          cylinder(r=2, h=7.5, center=true);
      }
    }
  }
  translate([0, 0, (l / 2) + 0.75])
    cylinder(r=19, h=1.5, center=true);
  color("silver")
  union() {
    translate([0, 0, (l / 2) + 11.5])
      cylinder(r=3, h=20, center=true);
    translate([0, 0, -(l / 2) - 7])
      cylinder(r=3, h=20, center=true);
  }
}

// Test renders.

*yellow_dc_gearmotor_straight();

*denso_power_window_motor_L();

*ig32_gear_motor_with_sprocket_and_plate();

*nema_23_stepper_motor();

solarbotics_gearmotor_angled();

// Unite MY1016 with measurements.
*union() {
  unite_my1016();
  color("green")
  union() {
    // Lengths (i.e. X-axis distances).
    // Length between the extreme edges of the mounts.
    translate([7, 54, -1])
      cube([55, 1, 2], center=true);
    // Length between the outer edges of the mount holes.
    translate([7, 46.5, -1])
      cube([48, 1, 2], center=true);
    // Length between the inner edges of the mount holes.
    translate([7, 47.5, -1])
      cube([35, 1, 2], center=true);
  }
  color("blue")
  union() {
    // Widths (i.e. Y-axis distances).
    // Width between the extreme edges of the mounts.
    translate([-20, 0, -1])
      cube([1, 108, 2], center=true);
    // Width between the outer edges of the mount holes.
    translate([-13, 0, -1])
      cube([1, 101, 2], center=true);
    // Width between the inner edges of the mount holes.
    translate([-14, 0, -1])
      cube([1, 88, 2], center=true);
  }
}

// Unite MY6812 with measurements.
*union() {
  unite_my6812();
  color("green")
  union() {
    // Lengths (i.e. X-axis distances).
    // Full body length
    translate([0.25, 34, 0])
      cube([89.5, 1, 1], center=true);
    // Length between shaft base and sprocket.
    translate([51, 6, 0])
      cube([12, 1, 1], center=true);
    // Length between sprocket and shaft end.
    translate([65, 6, 0])
      cube([10, 1, 1], center=true);
  }
}
